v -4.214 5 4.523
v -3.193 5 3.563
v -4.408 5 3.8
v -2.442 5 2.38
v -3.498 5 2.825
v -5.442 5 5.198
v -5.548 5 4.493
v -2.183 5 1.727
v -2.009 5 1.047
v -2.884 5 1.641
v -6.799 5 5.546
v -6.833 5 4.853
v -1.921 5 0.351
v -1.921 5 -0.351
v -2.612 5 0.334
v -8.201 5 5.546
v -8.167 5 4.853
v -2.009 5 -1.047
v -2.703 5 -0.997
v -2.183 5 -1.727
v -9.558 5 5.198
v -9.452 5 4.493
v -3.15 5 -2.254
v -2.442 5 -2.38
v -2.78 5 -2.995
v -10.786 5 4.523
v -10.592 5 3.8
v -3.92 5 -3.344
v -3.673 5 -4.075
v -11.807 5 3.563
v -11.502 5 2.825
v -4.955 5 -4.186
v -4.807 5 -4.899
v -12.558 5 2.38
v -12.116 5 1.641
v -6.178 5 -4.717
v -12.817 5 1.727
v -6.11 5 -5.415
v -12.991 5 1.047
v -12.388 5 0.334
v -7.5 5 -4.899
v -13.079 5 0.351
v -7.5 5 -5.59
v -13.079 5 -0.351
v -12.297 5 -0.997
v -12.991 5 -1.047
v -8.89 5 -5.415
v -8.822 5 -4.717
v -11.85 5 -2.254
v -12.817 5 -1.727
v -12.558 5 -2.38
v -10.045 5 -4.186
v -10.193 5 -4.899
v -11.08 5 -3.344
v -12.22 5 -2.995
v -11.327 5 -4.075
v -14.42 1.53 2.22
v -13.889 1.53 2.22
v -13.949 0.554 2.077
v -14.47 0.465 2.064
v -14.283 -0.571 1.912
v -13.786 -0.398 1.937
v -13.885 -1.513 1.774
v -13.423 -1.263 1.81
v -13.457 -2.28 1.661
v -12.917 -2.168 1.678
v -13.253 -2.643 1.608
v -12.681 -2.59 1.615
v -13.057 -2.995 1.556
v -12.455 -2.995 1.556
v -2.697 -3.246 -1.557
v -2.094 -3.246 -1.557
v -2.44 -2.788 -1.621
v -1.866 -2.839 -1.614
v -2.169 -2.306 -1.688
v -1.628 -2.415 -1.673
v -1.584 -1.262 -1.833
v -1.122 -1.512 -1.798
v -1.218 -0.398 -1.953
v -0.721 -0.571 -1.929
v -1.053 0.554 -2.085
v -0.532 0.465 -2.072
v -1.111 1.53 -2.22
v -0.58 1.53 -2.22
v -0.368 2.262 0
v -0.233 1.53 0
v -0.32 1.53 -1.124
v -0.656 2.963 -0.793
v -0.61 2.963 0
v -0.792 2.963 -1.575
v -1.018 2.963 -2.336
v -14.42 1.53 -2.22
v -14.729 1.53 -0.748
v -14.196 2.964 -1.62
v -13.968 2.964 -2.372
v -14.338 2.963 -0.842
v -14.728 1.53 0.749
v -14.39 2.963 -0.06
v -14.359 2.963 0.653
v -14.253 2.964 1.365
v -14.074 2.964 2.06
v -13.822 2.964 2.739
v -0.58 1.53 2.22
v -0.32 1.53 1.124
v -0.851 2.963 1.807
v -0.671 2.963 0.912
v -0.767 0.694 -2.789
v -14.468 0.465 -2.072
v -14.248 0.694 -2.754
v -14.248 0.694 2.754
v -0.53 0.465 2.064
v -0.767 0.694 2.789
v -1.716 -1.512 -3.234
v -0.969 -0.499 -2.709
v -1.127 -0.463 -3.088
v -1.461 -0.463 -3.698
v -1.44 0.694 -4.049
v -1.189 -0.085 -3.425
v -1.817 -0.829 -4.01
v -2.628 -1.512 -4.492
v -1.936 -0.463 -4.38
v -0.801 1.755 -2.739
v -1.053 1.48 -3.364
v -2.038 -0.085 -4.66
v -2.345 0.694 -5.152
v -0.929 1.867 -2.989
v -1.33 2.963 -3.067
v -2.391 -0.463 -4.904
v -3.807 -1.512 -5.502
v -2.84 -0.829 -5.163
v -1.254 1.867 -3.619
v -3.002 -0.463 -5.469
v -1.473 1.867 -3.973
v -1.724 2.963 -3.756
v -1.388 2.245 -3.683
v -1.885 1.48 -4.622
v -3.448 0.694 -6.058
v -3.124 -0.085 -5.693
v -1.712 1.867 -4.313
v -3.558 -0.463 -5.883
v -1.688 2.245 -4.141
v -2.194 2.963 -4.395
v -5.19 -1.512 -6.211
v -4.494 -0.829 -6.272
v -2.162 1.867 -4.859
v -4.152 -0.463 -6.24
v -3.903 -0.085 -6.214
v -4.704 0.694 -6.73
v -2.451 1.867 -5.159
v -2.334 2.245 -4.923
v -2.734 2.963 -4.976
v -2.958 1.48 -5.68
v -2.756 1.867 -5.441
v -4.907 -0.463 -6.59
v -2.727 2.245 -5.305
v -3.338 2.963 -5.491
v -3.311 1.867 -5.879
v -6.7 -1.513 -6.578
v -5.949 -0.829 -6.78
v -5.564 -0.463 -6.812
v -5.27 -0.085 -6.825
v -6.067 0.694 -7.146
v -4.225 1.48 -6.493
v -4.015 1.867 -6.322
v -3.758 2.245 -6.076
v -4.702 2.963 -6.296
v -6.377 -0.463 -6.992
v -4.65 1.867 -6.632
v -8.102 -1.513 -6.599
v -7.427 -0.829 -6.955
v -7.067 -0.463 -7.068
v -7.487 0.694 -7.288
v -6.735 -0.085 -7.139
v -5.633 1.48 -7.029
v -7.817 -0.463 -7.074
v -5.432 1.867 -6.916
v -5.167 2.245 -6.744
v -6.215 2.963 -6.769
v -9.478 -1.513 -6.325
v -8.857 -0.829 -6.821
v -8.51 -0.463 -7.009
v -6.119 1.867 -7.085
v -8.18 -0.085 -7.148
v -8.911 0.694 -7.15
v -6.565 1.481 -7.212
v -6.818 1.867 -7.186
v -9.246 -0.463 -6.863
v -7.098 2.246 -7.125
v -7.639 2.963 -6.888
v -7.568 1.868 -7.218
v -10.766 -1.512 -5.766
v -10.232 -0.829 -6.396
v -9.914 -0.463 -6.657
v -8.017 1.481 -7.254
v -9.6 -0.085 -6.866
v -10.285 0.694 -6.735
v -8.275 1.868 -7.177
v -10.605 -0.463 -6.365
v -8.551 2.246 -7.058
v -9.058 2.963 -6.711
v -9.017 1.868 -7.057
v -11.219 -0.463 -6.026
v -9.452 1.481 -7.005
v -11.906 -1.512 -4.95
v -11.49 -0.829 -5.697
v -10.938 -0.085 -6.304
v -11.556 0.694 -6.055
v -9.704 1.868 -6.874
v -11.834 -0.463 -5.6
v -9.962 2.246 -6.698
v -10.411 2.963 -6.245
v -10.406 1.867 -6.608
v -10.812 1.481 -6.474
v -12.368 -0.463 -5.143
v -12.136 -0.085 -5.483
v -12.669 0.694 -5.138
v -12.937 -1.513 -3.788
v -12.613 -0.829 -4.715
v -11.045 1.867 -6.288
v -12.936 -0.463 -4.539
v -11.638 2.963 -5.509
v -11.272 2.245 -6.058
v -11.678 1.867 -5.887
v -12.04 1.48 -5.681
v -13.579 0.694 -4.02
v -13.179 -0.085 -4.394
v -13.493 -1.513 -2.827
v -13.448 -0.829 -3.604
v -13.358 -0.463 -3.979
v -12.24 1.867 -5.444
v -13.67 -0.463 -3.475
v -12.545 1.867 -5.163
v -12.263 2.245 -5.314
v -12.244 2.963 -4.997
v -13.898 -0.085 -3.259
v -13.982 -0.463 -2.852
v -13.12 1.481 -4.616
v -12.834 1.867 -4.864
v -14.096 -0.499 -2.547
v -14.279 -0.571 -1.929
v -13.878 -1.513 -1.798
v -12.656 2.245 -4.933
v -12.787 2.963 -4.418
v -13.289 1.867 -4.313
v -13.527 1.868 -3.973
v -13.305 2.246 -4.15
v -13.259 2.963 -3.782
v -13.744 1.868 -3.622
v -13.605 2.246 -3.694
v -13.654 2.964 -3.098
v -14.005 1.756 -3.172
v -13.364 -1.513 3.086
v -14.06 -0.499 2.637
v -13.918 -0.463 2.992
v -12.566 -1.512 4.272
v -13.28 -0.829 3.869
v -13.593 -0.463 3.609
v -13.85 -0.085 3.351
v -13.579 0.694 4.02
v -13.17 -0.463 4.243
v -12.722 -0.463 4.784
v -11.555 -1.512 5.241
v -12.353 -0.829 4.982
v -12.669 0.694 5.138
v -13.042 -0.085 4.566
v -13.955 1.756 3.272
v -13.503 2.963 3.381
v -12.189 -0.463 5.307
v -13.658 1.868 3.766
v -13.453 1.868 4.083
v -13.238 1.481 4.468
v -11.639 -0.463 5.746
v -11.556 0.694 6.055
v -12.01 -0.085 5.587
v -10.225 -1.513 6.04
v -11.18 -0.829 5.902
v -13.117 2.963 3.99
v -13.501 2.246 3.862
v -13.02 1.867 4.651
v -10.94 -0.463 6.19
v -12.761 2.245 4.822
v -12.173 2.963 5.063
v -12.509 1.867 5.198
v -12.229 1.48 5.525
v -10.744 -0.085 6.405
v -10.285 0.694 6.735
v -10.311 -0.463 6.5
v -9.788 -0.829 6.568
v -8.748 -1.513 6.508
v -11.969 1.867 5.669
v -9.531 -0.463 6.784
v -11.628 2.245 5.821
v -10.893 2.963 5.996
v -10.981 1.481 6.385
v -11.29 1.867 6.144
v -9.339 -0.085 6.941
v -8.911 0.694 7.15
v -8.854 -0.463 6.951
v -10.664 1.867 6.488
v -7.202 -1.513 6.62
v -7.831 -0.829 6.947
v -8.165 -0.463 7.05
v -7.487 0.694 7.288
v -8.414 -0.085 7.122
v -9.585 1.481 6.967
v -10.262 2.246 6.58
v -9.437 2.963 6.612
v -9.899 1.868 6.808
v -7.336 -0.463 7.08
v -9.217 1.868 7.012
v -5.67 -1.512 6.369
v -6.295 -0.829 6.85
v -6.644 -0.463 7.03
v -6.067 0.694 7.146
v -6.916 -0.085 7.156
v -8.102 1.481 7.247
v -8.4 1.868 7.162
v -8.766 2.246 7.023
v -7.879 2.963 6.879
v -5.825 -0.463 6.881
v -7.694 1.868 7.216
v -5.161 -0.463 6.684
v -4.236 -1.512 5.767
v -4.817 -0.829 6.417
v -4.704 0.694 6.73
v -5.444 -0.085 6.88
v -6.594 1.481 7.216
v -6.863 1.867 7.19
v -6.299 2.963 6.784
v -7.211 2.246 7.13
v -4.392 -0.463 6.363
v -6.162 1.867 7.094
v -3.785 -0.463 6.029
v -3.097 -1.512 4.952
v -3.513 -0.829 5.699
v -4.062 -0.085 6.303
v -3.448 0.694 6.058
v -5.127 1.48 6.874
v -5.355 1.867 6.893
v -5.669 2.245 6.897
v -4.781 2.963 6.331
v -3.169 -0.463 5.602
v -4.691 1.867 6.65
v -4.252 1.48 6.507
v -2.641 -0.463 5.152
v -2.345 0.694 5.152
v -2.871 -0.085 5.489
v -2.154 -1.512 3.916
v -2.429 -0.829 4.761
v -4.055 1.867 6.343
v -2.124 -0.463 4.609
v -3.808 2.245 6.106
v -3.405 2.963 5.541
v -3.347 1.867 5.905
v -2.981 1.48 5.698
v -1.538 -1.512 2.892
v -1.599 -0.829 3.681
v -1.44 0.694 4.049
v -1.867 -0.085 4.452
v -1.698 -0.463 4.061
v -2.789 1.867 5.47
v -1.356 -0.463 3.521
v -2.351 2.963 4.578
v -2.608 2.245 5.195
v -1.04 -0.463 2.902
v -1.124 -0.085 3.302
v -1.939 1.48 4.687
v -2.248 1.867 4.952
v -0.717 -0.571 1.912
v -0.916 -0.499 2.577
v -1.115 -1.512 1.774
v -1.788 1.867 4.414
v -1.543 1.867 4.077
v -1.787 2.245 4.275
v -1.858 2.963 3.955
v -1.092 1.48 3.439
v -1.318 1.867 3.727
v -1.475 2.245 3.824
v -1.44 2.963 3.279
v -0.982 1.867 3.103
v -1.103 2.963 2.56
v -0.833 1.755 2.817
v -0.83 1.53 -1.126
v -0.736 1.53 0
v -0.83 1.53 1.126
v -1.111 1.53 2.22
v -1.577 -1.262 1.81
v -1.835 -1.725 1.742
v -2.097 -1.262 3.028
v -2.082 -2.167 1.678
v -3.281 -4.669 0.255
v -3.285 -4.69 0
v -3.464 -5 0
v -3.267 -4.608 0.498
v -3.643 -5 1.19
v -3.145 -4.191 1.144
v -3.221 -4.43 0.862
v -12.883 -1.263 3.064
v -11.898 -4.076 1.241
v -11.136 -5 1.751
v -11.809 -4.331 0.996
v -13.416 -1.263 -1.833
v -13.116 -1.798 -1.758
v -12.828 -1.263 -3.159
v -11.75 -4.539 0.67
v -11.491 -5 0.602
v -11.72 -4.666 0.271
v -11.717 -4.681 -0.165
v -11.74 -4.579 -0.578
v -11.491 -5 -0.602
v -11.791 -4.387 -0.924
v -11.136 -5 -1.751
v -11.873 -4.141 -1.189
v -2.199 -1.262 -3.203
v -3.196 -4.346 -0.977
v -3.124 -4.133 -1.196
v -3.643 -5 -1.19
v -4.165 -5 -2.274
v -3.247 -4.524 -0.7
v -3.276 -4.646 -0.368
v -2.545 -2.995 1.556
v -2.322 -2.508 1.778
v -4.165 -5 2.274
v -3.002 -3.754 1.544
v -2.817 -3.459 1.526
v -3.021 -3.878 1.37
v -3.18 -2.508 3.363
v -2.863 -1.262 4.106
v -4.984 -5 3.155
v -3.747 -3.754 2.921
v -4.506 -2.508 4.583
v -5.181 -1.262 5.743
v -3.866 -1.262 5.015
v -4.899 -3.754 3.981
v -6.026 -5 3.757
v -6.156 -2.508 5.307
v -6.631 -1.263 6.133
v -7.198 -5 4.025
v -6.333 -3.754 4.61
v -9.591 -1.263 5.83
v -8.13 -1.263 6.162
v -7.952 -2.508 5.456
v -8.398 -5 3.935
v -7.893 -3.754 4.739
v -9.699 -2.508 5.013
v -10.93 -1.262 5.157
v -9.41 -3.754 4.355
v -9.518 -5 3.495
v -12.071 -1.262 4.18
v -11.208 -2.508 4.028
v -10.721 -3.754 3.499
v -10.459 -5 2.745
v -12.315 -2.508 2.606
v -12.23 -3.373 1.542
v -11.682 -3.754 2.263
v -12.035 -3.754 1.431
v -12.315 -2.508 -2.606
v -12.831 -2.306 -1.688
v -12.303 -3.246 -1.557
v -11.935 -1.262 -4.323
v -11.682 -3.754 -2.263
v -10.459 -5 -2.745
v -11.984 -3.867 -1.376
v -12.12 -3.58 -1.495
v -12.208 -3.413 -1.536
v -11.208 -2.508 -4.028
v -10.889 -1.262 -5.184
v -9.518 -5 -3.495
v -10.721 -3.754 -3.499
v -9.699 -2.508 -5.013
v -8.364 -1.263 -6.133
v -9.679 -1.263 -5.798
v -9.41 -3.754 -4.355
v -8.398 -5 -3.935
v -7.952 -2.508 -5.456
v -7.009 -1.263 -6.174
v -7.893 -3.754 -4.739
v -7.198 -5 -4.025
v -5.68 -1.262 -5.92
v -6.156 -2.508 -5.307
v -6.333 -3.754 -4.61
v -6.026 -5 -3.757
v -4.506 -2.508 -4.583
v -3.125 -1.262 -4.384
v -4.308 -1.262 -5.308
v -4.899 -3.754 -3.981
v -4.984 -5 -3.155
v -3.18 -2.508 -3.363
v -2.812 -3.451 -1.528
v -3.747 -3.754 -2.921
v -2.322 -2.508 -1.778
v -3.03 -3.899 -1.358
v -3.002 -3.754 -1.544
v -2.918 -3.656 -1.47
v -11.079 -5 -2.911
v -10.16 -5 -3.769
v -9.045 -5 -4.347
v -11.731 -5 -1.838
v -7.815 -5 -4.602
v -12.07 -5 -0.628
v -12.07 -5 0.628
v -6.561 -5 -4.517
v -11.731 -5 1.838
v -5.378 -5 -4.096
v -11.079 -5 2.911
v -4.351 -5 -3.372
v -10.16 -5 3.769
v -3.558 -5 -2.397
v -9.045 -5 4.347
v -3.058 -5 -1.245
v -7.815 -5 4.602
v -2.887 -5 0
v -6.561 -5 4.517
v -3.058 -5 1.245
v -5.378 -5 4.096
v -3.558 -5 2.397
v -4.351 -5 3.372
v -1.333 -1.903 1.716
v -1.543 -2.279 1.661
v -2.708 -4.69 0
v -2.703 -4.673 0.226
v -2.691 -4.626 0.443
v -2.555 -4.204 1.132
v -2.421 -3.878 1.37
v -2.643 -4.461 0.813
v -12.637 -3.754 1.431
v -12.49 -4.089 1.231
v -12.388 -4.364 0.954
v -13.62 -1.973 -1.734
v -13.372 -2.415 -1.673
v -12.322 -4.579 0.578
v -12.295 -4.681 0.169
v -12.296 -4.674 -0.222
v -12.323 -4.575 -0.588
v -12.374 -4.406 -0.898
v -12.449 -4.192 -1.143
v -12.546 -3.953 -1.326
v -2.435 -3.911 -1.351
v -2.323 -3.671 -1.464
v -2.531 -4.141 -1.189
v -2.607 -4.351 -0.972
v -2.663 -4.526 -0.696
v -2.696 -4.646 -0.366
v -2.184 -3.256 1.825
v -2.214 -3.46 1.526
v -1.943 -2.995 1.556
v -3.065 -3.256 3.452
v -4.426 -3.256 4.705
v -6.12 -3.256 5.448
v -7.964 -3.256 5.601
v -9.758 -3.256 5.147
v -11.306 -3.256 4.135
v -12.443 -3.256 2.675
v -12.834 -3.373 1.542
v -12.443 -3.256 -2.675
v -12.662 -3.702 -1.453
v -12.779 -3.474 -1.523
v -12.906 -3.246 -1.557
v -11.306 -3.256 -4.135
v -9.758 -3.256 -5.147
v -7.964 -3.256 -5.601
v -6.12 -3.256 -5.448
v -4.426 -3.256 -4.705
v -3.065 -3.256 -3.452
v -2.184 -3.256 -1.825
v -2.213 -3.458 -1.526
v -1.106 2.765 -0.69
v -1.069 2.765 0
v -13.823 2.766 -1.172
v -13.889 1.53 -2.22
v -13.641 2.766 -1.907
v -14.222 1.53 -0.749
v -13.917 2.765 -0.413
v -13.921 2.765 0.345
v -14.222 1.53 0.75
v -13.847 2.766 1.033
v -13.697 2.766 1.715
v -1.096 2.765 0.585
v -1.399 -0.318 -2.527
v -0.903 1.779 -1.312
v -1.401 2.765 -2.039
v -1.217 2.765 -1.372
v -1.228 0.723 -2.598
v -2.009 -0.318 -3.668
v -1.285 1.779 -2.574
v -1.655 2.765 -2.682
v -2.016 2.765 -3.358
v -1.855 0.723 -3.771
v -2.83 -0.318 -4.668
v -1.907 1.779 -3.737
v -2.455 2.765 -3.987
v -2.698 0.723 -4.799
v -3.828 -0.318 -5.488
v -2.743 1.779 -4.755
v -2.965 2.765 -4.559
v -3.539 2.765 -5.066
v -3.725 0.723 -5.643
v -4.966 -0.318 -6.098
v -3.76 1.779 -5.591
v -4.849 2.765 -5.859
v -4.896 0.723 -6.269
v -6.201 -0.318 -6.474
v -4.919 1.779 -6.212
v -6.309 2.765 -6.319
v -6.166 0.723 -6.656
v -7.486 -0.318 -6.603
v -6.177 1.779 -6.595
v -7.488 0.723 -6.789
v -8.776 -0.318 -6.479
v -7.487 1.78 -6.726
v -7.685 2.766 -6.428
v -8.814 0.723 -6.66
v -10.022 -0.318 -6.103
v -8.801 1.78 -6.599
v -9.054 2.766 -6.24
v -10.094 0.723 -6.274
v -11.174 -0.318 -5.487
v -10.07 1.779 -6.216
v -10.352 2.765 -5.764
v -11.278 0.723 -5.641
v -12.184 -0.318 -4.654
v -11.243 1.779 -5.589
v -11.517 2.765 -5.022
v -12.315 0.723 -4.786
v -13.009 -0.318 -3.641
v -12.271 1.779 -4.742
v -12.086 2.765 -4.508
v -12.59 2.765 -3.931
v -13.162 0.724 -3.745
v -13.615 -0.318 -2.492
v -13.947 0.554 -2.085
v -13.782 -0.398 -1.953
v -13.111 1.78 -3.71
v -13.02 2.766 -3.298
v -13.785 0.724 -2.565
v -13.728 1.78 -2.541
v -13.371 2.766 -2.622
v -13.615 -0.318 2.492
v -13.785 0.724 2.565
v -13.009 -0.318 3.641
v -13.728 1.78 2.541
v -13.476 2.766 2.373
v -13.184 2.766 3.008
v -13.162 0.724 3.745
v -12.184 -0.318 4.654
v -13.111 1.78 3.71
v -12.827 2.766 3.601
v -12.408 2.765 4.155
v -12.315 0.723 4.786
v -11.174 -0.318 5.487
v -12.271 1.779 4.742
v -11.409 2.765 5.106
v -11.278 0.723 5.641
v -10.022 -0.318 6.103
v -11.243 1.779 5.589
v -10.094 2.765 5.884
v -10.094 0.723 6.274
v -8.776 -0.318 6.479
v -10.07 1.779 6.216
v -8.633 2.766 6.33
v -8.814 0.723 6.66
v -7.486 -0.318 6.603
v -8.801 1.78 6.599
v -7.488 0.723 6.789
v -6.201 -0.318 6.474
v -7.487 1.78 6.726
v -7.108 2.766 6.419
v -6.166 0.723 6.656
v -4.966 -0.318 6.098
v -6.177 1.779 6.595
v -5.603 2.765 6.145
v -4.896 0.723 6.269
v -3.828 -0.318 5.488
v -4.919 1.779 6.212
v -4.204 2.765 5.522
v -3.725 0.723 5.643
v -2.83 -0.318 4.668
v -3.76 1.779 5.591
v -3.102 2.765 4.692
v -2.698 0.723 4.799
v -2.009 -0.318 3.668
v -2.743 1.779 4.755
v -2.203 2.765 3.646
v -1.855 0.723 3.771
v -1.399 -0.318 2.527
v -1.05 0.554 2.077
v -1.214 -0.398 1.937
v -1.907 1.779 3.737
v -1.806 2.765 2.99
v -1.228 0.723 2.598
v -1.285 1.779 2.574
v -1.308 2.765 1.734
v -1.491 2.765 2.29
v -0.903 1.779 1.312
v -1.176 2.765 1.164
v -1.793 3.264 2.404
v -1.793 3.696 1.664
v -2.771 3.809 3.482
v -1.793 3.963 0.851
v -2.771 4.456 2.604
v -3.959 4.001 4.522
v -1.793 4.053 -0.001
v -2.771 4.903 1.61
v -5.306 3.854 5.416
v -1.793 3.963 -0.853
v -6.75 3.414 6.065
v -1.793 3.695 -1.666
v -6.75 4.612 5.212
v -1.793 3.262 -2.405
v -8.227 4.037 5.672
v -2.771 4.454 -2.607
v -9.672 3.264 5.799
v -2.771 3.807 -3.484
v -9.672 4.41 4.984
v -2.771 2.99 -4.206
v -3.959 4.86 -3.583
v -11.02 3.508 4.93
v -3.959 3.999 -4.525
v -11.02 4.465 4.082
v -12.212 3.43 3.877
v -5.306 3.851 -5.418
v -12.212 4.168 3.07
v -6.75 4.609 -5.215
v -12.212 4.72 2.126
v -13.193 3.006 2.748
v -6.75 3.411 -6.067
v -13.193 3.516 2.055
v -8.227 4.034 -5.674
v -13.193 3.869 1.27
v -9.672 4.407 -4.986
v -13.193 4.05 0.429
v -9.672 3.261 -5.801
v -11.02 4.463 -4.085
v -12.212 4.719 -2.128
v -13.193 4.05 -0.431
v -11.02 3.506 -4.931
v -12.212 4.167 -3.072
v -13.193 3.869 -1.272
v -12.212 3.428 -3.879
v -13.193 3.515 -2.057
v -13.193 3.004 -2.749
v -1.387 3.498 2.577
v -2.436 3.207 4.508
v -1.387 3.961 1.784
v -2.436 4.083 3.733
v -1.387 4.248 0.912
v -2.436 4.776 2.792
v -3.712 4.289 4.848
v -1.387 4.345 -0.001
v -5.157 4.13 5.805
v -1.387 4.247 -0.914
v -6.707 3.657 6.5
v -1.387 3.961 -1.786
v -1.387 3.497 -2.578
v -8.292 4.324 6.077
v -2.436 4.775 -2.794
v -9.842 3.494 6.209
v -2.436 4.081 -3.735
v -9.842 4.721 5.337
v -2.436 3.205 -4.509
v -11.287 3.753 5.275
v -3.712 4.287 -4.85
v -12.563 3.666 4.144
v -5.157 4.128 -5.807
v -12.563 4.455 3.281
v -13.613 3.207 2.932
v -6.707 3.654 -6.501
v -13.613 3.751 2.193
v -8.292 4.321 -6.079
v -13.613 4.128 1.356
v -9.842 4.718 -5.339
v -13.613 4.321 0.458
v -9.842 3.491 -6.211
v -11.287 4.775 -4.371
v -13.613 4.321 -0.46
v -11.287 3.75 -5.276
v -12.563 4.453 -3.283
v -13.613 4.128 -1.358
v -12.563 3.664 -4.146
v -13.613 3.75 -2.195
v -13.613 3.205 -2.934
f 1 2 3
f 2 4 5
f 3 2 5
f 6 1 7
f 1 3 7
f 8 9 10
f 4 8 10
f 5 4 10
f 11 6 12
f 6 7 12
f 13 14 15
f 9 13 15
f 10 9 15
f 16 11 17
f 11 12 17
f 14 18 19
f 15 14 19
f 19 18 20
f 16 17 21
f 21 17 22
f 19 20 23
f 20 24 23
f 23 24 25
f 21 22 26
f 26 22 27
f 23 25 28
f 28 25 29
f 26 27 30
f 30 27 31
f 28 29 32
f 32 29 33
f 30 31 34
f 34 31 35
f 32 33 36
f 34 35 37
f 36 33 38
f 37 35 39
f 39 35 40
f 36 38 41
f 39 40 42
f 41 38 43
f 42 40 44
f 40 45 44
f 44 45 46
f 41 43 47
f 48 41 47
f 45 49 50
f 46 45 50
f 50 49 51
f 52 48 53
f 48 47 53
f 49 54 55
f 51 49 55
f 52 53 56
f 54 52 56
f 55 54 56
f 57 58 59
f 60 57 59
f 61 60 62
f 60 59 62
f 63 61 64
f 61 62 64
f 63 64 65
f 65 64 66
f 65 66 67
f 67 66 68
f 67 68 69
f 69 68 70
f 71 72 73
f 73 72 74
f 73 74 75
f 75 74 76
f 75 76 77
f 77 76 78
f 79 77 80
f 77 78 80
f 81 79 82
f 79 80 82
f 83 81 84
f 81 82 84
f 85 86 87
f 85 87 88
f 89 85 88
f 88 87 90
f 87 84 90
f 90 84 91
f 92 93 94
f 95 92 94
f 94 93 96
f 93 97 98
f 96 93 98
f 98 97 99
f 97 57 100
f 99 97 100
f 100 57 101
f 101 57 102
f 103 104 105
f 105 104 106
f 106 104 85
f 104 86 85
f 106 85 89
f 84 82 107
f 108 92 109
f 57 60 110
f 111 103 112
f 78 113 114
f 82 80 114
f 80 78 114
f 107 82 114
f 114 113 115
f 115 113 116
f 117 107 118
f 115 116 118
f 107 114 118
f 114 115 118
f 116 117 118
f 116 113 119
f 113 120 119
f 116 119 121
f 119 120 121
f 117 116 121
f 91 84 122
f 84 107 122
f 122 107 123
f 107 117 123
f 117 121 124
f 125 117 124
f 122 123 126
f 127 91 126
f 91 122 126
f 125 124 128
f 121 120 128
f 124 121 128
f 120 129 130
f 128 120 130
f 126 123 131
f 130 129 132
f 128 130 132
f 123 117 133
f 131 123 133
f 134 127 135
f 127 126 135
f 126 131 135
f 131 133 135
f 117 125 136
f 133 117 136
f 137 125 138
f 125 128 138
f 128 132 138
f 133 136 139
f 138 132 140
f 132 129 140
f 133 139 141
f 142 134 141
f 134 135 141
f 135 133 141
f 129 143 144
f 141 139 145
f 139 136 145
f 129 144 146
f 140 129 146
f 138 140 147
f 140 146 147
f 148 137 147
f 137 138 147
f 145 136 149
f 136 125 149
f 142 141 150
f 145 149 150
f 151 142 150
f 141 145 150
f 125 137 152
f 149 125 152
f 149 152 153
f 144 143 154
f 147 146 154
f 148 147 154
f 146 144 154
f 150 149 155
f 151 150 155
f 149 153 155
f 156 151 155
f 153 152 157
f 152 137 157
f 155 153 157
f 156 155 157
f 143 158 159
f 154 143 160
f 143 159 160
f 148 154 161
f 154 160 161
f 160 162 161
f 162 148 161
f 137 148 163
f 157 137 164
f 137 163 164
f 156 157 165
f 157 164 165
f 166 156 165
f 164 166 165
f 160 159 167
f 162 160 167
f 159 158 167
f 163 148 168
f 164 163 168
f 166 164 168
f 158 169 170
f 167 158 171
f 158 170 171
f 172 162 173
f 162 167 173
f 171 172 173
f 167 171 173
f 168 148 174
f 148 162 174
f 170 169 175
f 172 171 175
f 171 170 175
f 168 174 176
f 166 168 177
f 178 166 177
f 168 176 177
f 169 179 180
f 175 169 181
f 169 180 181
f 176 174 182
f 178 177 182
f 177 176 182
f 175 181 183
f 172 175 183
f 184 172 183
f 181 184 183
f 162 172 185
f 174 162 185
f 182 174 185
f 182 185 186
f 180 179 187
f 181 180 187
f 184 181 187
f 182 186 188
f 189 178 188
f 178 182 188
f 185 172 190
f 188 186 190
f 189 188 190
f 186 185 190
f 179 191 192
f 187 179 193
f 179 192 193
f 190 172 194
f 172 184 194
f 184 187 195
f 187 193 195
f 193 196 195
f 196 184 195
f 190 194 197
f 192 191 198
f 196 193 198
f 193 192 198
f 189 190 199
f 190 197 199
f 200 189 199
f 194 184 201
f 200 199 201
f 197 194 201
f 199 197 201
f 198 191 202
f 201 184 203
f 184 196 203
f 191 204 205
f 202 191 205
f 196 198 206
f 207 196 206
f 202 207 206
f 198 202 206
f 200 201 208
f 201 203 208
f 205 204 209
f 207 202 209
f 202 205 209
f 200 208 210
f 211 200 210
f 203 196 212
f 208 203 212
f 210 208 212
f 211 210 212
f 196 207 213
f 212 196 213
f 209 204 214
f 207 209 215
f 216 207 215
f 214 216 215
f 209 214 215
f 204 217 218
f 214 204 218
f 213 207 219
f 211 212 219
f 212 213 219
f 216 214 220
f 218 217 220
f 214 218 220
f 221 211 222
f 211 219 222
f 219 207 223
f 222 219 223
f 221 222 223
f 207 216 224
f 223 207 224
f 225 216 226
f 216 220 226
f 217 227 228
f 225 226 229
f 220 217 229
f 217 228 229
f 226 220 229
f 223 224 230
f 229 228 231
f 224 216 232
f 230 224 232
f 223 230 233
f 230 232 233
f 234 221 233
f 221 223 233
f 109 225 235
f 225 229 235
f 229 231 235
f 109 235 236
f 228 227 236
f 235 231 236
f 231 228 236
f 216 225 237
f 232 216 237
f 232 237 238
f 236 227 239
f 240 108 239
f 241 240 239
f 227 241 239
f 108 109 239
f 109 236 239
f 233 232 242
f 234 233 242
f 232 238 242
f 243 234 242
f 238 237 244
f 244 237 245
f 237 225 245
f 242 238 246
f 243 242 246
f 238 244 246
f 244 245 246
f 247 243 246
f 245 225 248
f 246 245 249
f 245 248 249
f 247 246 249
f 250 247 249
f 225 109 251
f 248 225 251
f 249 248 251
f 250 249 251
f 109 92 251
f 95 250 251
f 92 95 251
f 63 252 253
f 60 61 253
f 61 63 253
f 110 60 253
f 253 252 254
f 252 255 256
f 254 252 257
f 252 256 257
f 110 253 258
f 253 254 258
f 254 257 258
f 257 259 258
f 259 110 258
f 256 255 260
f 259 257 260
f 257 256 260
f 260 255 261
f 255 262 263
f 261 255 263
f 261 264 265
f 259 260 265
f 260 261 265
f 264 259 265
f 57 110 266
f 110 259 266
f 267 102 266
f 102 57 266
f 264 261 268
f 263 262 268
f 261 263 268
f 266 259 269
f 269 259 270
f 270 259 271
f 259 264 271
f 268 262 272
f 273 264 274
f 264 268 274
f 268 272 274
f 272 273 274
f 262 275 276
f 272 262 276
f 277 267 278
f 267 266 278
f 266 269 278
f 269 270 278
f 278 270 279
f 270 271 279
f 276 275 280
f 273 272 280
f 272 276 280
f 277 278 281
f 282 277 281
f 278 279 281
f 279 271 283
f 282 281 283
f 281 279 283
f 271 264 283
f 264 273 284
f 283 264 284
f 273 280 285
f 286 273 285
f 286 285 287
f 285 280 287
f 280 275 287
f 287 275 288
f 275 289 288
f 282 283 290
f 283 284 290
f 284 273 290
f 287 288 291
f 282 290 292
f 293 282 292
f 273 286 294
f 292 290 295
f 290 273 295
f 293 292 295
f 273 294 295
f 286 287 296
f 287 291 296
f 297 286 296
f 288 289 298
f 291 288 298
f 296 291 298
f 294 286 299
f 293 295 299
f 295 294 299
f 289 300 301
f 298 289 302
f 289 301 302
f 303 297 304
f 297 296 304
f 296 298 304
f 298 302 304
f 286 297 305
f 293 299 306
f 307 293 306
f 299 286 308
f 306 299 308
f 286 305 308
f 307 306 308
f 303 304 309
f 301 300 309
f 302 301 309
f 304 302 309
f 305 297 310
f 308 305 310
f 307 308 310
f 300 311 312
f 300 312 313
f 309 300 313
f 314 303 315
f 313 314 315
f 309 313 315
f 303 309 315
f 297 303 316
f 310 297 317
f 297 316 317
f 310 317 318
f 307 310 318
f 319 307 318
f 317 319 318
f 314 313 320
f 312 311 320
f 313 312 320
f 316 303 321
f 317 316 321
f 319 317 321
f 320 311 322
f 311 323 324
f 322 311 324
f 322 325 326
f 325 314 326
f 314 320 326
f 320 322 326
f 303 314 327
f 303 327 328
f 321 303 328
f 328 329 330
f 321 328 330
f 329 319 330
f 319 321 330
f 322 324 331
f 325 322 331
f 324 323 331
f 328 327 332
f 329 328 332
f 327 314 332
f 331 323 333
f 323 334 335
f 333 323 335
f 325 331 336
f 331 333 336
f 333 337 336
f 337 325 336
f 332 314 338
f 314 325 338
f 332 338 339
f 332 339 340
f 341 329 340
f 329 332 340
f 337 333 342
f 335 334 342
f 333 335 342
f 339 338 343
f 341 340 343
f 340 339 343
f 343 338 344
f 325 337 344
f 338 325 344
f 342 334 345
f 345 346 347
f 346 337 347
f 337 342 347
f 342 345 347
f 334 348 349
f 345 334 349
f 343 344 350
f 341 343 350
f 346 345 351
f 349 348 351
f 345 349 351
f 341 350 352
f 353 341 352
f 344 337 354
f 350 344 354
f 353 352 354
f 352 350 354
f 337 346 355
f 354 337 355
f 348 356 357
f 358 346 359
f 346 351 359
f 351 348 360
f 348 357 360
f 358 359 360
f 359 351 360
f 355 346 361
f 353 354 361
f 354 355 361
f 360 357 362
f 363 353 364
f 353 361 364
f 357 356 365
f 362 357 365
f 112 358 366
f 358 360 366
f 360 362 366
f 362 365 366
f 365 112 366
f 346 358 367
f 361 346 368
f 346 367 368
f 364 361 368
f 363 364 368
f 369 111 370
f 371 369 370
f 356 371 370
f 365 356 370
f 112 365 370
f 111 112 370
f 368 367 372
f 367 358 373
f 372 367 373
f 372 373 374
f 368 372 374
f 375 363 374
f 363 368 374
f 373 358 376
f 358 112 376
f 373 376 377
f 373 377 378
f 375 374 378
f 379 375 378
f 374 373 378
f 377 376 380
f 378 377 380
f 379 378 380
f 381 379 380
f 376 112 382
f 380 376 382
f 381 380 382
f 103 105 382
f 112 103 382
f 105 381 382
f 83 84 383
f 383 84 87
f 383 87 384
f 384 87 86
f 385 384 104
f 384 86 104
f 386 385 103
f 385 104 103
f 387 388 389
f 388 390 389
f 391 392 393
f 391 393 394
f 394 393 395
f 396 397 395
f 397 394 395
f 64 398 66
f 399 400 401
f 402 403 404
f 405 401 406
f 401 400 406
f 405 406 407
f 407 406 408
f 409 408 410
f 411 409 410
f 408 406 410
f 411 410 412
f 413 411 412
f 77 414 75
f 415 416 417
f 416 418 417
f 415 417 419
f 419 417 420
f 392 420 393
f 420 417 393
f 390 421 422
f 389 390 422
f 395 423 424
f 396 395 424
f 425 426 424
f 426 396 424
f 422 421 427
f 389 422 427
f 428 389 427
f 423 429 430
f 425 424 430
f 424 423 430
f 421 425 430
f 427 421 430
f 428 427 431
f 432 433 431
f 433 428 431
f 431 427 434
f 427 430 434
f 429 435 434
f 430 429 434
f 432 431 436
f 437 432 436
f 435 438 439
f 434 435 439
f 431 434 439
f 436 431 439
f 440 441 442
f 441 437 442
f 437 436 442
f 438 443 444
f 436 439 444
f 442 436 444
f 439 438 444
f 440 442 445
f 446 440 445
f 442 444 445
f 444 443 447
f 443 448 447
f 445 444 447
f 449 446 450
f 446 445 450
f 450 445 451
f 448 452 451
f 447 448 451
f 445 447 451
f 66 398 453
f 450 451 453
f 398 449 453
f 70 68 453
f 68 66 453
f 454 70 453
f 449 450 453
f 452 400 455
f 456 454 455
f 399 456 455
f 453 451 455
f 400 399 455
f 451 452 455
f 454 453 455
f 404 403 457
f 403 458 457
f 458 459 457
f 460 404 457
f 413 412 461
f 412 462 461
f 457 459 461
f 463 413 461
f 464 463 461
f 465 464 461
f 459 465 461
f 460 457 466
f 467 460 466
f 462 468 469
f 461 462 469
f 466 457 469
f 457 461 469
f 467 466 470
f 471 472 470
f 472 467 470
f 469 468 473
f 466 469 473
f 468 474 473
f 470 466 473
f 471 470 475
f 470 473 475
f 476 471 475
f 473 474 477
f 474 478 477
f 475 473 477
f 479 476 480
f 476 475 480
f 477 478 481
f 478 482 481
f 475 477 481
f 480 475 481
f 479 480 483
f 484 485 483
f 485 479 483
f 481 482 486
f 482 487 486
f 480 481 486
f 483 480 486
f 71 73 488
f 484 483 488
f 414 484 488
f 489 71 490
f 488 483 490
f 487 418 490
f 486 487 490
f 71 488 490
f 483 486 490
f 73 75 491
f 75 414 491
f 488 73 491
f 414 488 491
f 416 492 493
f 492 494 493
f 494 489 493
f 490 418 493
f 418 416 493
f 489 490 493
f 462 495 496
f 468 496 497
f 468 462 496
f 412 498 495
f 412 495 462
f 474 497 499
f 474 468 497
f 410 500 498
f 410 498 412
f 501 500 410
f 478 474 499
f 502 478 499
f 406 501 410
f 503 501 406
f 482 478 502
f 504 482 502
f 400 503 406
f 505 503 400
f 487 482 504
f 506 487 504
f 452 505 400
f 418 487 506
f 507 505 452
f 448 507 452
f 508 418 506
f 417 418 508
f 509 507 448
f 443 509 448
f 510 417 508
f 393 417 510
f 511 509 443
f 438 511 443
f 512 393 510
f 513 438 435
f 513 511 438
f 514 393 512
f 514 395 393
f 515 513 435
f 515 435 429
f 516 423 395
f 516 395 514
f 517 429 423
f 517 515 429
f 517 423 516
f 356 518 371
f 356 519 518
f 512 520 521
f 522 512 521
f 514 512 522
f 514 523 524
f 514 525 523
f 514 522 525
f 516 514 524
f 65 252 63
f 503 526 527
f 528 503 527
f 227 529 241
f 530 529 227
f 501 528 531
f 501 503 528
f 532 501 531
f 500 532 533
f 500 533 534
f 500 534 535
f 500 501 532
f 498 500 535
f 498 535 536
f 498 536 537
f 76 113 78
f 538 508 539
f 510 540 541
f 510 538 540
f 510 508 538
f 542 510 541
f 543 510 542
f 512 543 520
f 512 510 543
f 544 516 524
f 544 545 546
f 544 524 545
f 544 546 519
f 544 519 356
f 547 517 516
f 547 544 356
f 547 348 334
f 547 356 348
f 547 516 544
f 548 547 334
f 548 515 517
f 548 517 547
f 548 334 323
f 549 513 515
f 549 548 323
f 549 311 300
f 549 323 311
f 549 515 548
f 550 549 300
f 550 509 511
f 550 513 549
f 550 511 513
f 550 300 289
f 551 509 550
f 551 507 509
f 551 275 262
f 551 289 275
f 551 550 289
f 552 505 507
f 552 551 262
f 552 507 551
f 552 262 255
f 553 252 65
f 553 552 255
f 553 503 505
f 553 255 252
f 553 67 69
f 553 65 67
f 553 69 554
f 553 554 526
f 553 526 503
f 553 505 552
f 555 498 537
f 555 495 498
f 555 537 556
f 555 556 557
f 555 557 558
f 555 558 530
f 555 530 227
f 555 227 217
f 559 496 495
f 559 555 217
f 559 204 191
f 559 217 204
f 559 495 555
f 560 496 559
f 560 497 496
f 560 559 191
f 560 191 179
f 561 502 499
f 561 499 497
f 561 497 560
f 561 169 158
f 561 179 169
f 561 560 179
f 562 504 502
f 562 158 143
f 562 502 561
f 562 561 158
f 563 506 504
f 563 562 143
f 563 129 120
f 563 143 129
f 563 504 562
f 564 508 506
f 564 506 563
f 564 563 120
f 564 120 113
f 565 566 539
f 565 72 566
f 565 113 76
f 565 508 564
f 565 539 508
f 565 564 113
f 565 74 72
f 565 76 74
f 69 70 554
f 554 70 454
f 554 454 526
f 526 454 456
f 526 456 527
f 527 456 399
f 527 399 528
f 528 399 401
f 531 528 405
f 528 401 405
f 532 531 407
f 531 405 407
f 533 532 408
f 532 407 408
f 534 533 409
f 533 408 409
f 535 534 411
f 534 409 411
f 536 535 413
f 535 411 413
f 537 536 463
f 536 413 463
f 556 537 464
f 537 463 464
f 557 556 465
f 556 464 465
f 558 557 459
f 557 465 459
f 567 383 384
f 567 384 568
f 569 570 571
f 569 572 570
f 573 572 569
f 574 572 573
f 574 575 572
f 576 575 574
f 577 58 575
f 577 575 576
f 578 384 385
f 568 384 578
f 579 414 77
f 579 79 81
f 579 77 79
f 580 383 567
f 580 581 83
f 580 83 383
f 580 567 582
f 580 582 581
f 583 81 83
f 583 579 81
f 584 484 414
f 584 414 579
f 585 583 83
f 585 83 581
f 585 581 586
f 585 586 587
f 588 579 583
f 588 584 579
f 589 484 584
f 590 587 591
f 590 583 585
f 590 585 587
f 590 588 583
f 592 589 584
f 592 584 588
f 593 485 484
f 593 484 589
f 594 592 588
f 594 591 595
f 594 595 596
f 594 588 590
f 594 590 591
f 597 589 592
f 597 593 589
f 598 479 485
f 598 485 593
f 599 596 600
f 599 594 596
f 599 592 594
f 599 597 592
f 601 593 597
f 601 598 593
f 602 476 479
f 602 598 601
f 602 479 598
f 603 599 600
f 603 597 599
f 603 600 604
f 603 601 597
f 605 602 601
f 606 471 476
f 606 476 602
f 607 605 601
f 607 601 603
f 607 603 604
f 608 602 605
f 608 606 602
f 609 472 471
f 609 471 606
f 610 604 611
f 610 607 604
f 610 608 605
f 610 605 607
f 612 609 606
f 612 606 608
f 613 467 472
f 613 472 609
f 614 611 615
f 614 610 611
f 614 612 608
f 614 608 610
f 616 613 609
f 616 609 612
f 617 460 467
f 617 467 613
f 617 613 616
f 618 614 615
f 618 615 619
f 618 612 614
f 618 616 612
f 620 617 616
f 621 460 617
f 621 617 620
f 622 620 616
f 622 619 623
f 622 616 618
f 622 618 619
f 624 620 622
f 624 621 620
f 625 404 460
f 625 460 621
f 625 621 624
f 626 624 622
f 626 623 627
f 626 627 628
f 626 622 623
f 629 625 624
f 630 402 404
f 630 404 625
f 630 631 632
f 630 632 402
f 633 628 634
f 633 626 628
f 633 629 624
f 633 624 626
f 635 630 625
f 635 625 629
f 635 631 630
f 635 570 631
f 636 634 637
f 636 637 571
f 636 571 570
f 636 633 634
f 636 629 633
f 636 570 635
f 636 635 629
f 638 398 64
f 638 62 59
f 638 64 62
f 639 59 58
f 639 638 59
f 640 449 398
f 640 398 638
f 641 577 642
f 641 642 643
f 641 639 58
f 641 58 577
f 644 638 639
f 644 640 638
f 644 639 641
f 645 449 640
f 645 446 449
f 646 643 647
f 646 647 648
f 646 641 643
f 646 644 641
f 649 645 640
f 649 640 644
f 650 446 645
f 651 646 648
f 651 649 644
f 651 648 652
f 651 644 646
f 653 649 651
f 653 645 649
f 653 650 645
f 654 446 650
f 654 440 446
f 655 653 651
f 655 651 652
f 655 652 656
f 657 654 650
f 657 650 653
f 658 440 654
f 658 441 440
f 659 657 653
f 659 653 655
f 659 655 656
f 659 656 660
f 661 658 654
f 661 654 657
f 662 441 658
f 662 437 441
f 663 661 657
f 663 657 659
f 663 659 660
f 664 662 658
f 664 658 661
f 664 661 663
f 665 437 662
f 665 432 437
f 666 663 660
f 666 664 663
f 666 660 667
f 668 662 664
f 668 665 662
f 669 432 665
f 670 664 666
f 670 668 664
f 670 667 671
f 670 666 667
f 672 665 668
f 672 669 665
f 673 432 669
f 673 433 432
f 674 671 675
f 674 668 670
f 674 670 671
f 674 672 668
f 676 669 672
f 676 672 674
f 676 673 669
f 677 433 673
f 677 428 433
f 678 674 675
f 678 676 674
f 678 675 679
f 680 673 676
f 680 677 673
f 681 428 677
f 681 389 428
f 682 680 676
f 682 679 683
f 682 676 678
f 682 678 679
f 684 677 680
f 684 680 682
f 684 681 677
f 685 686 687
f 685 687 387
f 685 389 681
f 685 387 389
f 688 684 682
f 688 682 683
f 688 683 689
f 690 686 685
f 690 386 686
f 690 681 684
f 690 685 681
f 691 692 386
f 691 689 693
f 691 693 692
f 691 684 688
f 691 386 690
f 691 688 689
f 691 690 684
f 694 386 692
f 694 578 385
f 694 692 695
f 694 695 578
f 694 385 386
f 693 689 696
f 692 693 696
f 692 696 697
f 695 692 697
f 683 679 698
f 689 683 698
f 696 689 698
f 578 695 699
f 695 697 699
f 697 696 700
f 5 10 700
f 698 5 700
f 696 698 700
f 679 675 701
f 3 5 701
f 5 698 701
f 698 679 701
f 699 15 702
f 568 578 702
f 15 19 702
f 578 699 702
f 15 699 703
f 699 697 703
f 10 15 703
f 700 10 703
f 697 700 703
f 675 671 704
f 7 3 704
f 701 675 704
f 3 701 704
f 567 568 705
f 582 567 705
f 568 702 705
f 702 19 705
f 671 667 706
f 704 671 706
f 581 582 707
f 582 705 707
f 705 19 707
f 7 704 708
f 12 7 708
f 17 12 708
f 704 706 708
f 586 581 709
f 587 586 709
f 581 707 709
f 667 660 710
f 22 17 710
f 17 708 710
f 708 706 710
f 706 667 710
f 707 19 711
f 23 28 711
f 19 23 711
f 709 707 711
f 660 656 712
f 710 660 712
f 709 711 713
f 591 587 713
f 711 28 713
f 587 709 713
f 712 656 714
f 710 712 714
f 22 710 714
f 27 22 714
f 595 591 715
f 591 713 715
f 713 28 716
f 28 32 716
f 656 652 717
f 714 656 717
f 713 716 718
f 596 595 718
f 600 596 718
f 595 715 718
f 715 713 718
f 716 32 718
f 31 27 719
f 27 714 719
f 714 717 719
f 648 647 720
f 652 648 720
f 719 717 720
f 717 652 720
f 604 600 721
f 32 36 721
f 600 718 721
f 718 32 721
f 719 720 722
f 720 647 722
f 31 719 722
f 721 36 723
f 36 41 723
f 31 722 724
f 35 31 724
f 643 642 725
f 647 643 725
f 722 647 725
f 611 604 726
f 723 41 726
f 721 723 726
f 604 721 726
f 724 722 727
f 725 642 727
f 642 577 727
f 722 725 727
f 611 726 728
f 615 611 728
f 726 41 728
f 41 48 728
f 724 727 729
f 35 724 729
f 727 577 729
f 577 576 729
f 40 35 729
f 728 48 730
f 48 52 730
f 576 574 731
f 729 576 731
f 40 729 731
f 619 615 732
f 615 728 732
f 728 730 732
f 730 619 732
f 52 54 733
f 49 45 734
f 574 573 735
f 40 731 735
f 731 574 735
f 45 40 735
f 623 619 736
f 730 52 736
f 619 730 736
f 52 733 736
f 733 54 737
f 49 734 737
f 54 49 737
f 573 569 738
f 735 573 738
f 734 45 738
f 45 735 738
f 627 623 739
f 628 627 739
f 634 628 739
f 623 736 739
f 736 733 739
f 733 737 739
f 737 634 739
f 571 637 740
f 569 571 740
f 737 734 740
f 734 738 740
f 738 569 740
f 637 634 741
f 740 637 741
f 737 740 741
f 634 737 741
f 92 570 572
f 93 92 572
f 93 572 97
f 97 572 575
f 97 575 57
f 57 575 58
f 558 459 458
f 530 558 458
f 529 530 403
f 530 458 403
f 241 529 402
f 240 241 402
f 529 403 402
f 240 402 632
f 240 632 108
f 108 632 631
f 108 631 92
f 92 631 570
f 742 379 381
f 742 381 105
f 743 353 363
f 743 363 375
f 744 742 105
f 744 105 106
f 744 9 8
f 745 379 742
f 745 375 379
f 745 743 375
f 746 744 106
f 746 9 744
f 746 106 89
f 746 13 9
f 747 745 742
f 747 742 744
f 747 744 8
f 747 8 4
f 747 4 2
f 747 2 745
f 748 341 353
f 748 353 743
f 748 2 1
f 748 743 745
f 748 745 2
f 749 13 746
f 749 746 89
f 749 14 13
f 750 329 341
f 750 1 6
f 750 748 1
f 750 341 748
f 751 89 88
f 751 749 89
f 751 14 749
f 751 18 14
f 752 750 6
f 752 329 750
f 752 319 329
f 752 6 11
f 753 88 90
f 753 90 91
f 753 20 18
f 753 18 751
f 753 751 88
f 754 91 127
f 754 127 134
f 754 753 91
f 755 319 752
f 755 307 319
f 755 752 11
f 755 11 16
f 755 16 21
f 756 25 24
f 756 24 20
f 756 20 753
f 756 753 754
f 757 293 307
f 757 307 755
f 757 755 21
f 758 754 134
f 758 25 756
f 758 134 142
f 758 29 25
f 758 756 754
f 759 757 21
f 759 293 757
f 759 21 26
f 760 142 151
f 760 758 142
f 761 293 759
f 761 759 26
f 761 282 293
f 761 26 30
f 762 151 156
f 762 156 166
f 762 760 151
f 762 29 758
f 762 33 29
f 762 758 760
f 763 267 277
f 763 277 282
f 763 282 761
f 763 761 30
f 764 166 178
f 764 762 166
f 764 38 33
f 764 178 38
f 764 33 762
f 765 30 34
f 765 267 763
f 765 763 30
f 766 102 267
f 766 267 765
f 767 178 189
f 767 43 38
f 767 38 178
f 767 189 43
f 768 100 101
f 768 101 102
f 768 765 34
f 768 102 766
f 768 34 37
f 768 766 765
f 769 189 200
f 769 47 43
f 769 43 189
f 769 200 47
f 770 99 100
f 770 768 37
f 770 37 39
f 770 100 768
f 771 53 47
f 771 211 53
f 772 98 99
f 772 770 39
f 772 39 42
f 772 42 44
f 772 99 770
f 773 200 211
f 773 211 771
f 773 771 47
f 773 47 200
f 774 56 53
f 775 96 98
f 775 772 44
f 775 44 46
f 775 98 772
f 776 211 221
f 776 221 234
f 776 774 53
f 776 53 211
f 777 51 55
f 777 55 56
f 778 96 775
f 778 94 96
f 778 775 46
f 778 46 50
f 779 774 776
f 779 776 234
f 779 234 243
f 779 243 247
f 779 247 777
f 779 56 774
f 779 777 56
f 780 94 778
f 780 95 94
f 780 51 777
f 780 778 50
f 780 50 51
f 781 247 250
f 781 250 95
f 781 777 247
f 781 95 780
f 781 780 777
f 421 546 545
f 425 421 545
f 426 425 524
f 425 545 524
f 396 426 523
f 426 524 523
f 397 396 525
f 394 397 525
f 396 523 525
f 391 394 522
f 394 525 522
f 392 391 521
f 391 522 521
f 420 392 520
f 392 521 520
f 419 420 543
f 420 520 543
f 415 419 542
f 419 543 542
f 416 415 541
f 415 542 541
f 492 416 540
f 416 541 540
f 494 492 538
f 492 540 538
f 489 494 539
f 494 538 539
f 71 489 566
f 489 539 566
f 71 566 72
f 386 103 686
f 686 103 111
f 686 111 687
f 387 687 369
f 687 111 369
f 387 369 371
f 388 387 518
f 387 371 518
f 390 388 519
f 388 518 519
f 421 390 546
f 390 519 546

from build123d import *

# Parameters (mm, degrees)
REVOLVE1_ANGLE      = 180
SKETCH8_R           = 7.5
BOSS_EXTRUDE1_DEPTH = 5
BOSS_EXTRUDE1_TAPER = 30
FILLET3_R           = 5
SHELL7_T            = -0.5
CUT_EXTRUDE1_DEPTH  = 23
CUT_EXTRUDE4_DEPTH  = 2.5


with BuildPart() as part:
    # Sketch5 → Revolve1 (revolve)
    with BuildSketch(Plane(origin=(0, 0, 0), x_dir=(1, 0, 0), z_dir=(0, 1, 0))):
        with BuildLine():
            Line((-15, 0), (0, 0))
            ThreePointArc((0, 0), (-7.5, -7.5), (-15, 0))
        make_face()
    revolve(axis=Axis((0, 0, 0), (-1, 0, 0)), revolution_arc=REVOLVE1_ANGLE)

    # Sketch8 → Boss-Extrude1 (add)
    with BuildSketch(Plane.XZ):
        with Locations((-7.5, 0)):
            Circle(SKETCH8_R)
    extrude(amount=BOSS_EXTRUDE1_DEPTH, taper=BOSS_EXTRUDE1_TAPER)

    # Fillet3
    fillet3_edges = [part.edges().sort_by_distance(p)[0] for p in [
        (-7.5, 0, -7.5),
    ]]
    fillet(fillet3_edges, radius=FILLET3_R)

    # Shell7
    shell7_openings = [part.faces().sort_by_distance(p)[0] for p in [
        (-7.5, -5, 0),
    ]]
    offset(amount=SHELL7_T, openings=shell7_openings, kind=Kind.INTERSECTION)

    # Sketch9 → Cut-Extrude1 (cut)
    with BuildSketch(Plane(origin=(0, 0, 0), x_dir=(0, 0, -1), z_dir=(1, 0, 0))):
        with BuildLine():
            Line((1.557300456, -3.245702646), (2.220059838, 1.52969178))
            Line((2.220059838, 1.52969178), (-2.220059838, 1.52969178))
            Line((-2.220059838, 1.52969178), (-1.556069246, -2.994983603))
            ThreePointArc((-1.556069246, -2.994983603), (-0.125361033, -4.684691185), (1.557300456, -3.245702646))
        make_face()
    extrude(amount=-CUT_EXTRUDE1_DEPTH, mode=Mode.SUBTRACT)

    # Sketch11 → Cut-Extrude4 (cut)
    with BuildSketch(Plane(origin=(0, 7.5, 0), x_dir=(1, 0, 0), z_dir=(0, 1, 0))):
        Polygon((-7.5, 6.89001607), (-0.60998393, 6.89001607), (-0.60998393, -6.89001607), (-14.767195706, -6.89001607), (-14.767195706, 0), (-14.767195706, 6.89001607), align=None)
    extrude(amount=-CUT_EXTRUDE4_DEPTH, mode=Mode.SUBTRACT)


solid = part.part
